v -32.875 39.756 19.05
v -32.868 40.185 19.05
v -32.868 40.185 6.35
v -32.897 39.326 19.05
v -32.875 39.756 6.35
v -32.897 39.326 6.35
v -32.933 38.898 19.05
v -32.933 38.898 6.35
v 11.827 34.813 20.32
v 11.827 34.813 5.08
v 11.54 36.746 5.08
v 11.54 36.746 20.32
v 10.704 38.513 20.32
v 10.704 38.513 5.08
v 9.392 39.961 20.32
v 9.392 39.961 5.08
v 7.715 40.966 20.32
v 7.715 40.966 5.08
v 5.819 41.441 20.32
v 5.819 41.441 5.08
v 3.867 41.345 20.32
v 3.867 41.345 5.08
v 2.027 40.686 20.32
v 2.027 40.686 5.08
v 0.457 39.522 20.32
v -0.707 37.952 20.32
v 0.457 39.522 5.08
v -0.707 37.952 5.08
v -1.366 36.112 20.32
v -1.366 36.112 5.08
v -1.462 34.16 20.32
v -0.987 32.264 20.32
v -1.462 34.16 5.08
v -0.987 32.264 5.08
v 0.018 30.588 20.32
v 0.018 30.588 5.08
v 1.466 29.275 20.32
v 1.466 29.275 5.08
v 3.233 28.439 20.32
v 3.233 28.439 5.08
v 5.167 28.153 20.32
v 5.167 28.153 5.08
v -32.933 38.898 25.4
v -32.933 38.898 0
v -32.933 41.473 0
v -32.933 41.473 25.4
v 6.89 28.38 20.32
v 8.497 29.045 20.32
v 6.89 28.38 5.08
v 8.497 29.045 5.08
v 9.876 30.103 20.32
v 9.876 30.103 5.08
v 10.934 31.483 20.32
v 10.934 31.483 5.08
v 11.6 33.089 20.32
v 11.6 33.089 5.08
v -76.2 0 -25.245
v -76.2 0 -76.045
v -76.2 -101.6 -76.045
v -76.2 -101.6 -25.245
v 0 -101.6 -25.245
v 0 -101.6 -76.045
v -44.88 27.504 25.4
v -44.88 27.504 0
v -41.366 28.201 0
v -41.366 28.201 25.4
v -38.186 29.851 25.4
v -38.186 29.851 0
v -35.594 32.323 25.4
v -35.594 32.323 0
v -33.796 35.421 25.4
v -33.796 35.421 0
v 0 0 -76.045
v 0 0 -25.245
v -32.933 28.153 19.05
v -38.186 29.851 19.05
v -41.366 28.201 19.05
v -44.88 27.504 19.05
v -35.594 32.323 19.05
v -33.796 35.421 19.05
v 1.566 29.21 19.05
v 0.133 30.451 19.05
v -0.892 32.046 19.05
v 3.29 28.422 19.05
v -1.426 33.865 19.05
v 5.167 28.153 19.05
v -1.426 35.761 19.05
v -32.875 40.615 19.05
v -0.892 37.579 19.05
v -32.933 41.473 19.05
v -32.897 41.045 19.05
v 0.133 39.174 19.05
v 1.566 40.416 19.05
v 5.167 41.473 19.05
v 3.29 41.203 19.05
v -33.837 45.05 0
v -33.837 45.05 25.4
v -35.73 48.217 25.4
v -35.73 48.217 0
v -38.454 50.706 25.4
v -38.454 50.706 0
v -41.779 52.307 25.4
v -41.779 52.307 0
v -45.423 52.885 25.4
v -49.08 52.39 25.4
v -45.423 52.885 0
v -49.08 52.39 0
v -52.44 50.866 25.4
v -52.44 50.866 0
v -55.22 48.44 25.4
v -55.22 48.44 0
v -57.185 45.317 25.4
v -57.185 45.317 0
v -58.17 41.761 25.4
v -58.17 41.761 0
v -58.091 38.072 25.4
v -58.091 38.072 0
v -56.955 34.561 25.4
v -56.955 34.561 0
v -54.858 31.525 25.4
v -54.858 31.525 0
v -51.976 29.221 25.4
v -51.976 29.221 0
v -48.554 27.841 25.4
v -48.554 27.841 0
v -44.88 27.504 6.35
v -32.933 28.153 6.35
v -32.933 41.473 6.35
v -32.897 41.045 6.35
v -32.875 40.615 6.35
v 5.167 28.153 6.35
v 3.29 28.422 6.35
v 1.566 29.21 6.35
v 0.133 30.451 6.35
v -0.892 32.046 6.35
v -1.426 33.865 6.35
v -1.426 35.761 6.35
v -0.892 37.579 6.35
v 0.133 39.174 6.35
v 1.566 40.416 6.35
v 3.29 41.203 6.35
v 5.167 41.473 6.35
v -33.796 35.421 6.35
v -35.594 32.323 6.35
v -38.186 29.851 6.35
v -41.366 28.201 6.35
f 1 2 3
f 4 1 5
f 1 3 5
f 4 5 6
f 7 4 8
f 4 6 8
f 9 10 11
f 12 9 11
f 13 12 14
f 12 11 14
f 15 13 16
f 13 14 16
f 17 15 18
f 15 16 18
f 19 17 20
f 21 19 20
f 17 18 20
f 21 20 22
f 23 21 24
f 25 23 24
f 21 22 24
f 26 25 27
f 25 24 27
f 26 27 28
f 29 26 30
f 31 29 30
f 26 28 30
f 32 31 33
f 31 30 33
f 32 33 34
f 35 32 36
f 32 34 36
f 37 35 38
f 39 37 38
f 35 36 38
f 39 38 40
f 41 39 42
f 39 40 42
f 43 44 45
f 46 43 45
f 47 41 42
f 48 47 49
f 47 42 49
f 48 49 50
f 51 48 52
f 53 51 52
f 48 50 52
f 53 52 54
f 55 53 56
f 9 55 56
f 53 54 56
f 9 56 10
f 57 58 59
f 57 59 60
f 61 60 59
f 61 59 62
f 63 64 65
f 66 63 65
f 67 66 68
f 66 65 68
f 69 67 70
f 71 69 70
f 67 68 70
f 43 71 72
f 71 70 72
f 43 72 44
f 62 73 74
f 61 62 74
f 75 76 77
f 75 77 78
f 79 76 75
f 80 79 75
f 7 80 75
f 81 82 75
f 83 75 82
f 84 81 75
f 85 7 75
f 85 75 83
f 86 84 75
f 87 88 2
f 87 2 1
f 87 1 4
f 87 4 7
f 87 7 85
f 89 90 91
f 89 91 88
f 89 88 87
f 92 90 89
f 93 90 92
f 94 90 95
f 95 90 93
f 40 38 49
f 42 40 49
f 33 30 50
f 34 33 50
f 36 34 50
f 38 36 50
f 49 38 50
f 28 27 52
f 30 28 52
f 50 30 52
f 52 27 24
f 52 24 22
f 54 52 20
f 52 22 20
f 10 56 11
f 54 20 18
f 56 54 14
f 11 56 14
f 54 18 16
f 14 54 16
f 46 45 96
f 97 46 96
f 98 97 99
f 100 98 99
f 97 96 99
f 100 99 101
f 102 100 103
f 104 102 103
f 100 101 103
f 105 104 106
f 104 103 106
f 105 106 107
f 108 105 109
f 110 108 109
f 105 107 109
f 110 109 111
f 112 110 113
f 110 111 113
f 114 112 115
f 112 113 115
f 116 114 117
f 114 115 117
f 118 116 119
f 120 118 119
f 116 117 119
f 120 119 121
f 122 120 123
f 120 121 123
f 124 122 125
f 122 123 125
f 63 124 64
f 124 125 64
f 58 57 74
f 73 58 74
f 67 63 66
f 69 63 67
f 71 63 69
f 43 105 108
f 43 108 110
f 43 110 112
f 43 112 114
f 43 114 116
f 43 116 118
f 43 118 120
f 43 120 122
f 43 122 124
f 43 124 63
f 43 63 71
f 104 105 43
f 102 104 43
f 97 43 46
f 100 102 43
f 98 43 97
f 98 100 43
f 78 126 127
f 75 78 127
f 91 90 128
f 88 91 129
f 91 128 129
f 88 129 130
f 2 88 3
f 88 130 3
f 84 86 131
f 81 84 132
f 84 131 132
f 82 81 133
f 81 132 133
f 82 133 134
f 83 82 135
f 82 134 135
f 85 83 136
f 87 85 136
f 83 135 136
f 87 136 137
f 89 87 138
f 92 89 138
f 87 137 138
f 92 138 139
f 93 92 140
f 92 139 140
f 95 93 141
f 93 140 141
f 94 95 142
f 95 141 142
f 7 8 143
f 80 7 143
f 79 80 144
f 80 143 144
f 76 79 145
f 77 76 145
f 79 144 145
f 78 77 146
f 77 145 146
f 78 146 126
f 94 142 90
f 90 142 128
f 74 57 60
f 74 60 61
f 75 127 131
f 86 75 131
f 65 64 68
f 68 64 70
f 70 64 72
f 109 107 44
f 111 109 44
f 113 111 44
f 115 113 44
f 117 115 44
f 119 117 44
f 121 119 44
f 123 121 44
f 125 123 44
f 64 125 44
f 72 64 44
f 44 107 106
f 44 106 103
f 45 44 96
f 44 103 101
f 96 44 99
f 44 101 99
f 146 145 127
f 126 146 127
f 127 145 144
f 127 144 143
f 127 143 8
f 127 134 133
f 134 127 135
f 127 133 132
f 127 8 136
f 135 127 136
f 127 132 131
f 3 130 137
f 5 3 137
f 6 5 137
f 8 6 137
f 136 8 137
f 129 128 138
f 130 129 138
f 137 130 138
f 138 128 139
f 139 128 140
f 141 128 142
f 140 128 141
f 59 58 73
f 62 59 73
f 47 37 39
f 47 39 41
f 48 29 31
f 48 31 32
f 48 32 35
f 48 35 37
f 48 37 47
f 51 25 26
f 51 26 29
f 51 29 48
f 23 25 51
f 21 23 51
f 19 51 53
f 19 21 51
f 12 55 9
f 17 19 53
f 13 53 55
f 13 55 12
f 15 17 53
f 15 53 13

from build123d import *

# Parameters (mm, degrees)
F0_W     = 76.2
F0_H     = 50.8
F1_DEPTH = 101.6
F3_DEPTH = 25.4
F4_DEPTH = 19.05
F5_DEPTH = 6.35
F6_DEPTH = 5.08
F7_DEPTH = 5.08


with BuildPart() as f1:
    # F0 (on Front) → F1 (new body)
    with BuildSketch(Plane.XZ):
        with Locations((-38.1, -50.6448104508)):
            Rectangle(F0_W, F0_H)
    extrude(amount=F1_DEPTH)


with BuildPart() as f3:
    # F2 (on Top) → F3 (new body)
    with BuildSketch(Plane.XY):
        with BuildLine():
            Line((-32.9334767098, 38.8978572475), (-32.9334767098, 41.4728744043))
            ThreePointArc((-32.9334767098, 41.4728744043), (-55.2198972528, 48.4395618803), (-44.8795228111, 27.5040434626))
            ThreePointArc((-44.8795228111, 27.5040434626), (-36.8027194409, 30.9952045741), (-32.9334767098, 38.8978572475))
        make_face()
    extrude(amount=F3_DEPTH)


with BuildPart() as f3b:
    # F2 (on Top) → F3, piece 2 (new body)
    with BuildSketch(Plane.XY):
        with BuildLine():
            ThreePointArc((11.8266381753, 34.8127595193), (9.8759356889, 39.522171918), (5.1665232902, 41.4728744043))
            Line((5.1665232902, 41.4728744043), (5.1665232902, 28.1526446342))
            ThreePointArc((5.1665232902, 28.1526446342), (9.8759356889, 30.1033471206), (11.8266381753, 34.8127595193))
        make_face()
        with BuildLine():
            Line((5.1665232902, 28.1526446342), (5.1665232902, 41.4728744043))
            ThreePointArc((5.1665232902, 41.4728744043), (-1.4935915948, 34.8127595193), (5.1665232902, 28.1526446342))
        make_face()
    extrude(amount=F3_DEPTH)

    # F6 (cut): a face of the model
    f6_faces = [f3b.faces().sort_by_distance(p)[0] for p in [
        (5.1665232902, 34.8127595193, 25.4),
    ]]
    extrude(f6_faces, amount=-F6_DEPTH, mode=Mode.SUBTRACT)

    # F7 (cut): a face of the model
    f7_faces = [f3b.faces().sort_by_distance(p)[0] for p in [
        (5.1665232902, 34.8127595193, 0),
    ]]
    extrude(f7_faces, amount=-F7_DEPTH, mode=Mode.SUBTRACT)


with BuildPart() as f4:
    # F2 (on Top) → F4 (new body)
    with BuildSketch(Plane.XY):
        with BuildLine():
            ThreePointArc((-32.9334767098, 41.4728744043), (-32.8844136472, 40.8299508898), (-32.8680452287, 40.1853658259))
            ThreePointArc((-32.8680452287, 40.1853658259), (-32.8844136472, 39.540780762), (-32.9334767098, 38.8978572475))
            Line((-32.9334767098, 38.8978572475), (-32.9334767098, 28.1526446342))
            Line((-32.9334767098, 28.1526446342), (5.1665232902, 28.1526446342))
            ThreePointArc((5.1665232902, 28.1526446342), (-1.4935915948, 34.8127595193), (5.1665232902, 41.4728744043))
            Line((5.1665232902, 41.4728744043), (-32.9334767098, 41.4728744043))
        make_face()
        with BuildLine():
            Line((-32.9334767098, 28.1526446342), (-32.9334767098, 38.8978572475))
            ThreePointArc((-32.9334767098, 38.8978572475), (-36.8027194409, 30.9952045741), (-44.8795228111, 27.5040434626))
            Line((-44.8795228111, 27.5040434626), (-32.9334767098, 28.1526446342))
        make_face()
    extrude(amount=F4_DEPTH)

    # F5 (cut): a face of the model
    f5_faces = [f4.faces().sort_by_distance(p)[0] for p in [
        (-17.6782565044, 34.5436181954, 0),
    ]]
    extrude(f5_faces, amount=-F5_DEPTH, mode=Mode.SUBTRACT)


solid = Compound([f1.part, f3.part, f3b.part, f4.part])
